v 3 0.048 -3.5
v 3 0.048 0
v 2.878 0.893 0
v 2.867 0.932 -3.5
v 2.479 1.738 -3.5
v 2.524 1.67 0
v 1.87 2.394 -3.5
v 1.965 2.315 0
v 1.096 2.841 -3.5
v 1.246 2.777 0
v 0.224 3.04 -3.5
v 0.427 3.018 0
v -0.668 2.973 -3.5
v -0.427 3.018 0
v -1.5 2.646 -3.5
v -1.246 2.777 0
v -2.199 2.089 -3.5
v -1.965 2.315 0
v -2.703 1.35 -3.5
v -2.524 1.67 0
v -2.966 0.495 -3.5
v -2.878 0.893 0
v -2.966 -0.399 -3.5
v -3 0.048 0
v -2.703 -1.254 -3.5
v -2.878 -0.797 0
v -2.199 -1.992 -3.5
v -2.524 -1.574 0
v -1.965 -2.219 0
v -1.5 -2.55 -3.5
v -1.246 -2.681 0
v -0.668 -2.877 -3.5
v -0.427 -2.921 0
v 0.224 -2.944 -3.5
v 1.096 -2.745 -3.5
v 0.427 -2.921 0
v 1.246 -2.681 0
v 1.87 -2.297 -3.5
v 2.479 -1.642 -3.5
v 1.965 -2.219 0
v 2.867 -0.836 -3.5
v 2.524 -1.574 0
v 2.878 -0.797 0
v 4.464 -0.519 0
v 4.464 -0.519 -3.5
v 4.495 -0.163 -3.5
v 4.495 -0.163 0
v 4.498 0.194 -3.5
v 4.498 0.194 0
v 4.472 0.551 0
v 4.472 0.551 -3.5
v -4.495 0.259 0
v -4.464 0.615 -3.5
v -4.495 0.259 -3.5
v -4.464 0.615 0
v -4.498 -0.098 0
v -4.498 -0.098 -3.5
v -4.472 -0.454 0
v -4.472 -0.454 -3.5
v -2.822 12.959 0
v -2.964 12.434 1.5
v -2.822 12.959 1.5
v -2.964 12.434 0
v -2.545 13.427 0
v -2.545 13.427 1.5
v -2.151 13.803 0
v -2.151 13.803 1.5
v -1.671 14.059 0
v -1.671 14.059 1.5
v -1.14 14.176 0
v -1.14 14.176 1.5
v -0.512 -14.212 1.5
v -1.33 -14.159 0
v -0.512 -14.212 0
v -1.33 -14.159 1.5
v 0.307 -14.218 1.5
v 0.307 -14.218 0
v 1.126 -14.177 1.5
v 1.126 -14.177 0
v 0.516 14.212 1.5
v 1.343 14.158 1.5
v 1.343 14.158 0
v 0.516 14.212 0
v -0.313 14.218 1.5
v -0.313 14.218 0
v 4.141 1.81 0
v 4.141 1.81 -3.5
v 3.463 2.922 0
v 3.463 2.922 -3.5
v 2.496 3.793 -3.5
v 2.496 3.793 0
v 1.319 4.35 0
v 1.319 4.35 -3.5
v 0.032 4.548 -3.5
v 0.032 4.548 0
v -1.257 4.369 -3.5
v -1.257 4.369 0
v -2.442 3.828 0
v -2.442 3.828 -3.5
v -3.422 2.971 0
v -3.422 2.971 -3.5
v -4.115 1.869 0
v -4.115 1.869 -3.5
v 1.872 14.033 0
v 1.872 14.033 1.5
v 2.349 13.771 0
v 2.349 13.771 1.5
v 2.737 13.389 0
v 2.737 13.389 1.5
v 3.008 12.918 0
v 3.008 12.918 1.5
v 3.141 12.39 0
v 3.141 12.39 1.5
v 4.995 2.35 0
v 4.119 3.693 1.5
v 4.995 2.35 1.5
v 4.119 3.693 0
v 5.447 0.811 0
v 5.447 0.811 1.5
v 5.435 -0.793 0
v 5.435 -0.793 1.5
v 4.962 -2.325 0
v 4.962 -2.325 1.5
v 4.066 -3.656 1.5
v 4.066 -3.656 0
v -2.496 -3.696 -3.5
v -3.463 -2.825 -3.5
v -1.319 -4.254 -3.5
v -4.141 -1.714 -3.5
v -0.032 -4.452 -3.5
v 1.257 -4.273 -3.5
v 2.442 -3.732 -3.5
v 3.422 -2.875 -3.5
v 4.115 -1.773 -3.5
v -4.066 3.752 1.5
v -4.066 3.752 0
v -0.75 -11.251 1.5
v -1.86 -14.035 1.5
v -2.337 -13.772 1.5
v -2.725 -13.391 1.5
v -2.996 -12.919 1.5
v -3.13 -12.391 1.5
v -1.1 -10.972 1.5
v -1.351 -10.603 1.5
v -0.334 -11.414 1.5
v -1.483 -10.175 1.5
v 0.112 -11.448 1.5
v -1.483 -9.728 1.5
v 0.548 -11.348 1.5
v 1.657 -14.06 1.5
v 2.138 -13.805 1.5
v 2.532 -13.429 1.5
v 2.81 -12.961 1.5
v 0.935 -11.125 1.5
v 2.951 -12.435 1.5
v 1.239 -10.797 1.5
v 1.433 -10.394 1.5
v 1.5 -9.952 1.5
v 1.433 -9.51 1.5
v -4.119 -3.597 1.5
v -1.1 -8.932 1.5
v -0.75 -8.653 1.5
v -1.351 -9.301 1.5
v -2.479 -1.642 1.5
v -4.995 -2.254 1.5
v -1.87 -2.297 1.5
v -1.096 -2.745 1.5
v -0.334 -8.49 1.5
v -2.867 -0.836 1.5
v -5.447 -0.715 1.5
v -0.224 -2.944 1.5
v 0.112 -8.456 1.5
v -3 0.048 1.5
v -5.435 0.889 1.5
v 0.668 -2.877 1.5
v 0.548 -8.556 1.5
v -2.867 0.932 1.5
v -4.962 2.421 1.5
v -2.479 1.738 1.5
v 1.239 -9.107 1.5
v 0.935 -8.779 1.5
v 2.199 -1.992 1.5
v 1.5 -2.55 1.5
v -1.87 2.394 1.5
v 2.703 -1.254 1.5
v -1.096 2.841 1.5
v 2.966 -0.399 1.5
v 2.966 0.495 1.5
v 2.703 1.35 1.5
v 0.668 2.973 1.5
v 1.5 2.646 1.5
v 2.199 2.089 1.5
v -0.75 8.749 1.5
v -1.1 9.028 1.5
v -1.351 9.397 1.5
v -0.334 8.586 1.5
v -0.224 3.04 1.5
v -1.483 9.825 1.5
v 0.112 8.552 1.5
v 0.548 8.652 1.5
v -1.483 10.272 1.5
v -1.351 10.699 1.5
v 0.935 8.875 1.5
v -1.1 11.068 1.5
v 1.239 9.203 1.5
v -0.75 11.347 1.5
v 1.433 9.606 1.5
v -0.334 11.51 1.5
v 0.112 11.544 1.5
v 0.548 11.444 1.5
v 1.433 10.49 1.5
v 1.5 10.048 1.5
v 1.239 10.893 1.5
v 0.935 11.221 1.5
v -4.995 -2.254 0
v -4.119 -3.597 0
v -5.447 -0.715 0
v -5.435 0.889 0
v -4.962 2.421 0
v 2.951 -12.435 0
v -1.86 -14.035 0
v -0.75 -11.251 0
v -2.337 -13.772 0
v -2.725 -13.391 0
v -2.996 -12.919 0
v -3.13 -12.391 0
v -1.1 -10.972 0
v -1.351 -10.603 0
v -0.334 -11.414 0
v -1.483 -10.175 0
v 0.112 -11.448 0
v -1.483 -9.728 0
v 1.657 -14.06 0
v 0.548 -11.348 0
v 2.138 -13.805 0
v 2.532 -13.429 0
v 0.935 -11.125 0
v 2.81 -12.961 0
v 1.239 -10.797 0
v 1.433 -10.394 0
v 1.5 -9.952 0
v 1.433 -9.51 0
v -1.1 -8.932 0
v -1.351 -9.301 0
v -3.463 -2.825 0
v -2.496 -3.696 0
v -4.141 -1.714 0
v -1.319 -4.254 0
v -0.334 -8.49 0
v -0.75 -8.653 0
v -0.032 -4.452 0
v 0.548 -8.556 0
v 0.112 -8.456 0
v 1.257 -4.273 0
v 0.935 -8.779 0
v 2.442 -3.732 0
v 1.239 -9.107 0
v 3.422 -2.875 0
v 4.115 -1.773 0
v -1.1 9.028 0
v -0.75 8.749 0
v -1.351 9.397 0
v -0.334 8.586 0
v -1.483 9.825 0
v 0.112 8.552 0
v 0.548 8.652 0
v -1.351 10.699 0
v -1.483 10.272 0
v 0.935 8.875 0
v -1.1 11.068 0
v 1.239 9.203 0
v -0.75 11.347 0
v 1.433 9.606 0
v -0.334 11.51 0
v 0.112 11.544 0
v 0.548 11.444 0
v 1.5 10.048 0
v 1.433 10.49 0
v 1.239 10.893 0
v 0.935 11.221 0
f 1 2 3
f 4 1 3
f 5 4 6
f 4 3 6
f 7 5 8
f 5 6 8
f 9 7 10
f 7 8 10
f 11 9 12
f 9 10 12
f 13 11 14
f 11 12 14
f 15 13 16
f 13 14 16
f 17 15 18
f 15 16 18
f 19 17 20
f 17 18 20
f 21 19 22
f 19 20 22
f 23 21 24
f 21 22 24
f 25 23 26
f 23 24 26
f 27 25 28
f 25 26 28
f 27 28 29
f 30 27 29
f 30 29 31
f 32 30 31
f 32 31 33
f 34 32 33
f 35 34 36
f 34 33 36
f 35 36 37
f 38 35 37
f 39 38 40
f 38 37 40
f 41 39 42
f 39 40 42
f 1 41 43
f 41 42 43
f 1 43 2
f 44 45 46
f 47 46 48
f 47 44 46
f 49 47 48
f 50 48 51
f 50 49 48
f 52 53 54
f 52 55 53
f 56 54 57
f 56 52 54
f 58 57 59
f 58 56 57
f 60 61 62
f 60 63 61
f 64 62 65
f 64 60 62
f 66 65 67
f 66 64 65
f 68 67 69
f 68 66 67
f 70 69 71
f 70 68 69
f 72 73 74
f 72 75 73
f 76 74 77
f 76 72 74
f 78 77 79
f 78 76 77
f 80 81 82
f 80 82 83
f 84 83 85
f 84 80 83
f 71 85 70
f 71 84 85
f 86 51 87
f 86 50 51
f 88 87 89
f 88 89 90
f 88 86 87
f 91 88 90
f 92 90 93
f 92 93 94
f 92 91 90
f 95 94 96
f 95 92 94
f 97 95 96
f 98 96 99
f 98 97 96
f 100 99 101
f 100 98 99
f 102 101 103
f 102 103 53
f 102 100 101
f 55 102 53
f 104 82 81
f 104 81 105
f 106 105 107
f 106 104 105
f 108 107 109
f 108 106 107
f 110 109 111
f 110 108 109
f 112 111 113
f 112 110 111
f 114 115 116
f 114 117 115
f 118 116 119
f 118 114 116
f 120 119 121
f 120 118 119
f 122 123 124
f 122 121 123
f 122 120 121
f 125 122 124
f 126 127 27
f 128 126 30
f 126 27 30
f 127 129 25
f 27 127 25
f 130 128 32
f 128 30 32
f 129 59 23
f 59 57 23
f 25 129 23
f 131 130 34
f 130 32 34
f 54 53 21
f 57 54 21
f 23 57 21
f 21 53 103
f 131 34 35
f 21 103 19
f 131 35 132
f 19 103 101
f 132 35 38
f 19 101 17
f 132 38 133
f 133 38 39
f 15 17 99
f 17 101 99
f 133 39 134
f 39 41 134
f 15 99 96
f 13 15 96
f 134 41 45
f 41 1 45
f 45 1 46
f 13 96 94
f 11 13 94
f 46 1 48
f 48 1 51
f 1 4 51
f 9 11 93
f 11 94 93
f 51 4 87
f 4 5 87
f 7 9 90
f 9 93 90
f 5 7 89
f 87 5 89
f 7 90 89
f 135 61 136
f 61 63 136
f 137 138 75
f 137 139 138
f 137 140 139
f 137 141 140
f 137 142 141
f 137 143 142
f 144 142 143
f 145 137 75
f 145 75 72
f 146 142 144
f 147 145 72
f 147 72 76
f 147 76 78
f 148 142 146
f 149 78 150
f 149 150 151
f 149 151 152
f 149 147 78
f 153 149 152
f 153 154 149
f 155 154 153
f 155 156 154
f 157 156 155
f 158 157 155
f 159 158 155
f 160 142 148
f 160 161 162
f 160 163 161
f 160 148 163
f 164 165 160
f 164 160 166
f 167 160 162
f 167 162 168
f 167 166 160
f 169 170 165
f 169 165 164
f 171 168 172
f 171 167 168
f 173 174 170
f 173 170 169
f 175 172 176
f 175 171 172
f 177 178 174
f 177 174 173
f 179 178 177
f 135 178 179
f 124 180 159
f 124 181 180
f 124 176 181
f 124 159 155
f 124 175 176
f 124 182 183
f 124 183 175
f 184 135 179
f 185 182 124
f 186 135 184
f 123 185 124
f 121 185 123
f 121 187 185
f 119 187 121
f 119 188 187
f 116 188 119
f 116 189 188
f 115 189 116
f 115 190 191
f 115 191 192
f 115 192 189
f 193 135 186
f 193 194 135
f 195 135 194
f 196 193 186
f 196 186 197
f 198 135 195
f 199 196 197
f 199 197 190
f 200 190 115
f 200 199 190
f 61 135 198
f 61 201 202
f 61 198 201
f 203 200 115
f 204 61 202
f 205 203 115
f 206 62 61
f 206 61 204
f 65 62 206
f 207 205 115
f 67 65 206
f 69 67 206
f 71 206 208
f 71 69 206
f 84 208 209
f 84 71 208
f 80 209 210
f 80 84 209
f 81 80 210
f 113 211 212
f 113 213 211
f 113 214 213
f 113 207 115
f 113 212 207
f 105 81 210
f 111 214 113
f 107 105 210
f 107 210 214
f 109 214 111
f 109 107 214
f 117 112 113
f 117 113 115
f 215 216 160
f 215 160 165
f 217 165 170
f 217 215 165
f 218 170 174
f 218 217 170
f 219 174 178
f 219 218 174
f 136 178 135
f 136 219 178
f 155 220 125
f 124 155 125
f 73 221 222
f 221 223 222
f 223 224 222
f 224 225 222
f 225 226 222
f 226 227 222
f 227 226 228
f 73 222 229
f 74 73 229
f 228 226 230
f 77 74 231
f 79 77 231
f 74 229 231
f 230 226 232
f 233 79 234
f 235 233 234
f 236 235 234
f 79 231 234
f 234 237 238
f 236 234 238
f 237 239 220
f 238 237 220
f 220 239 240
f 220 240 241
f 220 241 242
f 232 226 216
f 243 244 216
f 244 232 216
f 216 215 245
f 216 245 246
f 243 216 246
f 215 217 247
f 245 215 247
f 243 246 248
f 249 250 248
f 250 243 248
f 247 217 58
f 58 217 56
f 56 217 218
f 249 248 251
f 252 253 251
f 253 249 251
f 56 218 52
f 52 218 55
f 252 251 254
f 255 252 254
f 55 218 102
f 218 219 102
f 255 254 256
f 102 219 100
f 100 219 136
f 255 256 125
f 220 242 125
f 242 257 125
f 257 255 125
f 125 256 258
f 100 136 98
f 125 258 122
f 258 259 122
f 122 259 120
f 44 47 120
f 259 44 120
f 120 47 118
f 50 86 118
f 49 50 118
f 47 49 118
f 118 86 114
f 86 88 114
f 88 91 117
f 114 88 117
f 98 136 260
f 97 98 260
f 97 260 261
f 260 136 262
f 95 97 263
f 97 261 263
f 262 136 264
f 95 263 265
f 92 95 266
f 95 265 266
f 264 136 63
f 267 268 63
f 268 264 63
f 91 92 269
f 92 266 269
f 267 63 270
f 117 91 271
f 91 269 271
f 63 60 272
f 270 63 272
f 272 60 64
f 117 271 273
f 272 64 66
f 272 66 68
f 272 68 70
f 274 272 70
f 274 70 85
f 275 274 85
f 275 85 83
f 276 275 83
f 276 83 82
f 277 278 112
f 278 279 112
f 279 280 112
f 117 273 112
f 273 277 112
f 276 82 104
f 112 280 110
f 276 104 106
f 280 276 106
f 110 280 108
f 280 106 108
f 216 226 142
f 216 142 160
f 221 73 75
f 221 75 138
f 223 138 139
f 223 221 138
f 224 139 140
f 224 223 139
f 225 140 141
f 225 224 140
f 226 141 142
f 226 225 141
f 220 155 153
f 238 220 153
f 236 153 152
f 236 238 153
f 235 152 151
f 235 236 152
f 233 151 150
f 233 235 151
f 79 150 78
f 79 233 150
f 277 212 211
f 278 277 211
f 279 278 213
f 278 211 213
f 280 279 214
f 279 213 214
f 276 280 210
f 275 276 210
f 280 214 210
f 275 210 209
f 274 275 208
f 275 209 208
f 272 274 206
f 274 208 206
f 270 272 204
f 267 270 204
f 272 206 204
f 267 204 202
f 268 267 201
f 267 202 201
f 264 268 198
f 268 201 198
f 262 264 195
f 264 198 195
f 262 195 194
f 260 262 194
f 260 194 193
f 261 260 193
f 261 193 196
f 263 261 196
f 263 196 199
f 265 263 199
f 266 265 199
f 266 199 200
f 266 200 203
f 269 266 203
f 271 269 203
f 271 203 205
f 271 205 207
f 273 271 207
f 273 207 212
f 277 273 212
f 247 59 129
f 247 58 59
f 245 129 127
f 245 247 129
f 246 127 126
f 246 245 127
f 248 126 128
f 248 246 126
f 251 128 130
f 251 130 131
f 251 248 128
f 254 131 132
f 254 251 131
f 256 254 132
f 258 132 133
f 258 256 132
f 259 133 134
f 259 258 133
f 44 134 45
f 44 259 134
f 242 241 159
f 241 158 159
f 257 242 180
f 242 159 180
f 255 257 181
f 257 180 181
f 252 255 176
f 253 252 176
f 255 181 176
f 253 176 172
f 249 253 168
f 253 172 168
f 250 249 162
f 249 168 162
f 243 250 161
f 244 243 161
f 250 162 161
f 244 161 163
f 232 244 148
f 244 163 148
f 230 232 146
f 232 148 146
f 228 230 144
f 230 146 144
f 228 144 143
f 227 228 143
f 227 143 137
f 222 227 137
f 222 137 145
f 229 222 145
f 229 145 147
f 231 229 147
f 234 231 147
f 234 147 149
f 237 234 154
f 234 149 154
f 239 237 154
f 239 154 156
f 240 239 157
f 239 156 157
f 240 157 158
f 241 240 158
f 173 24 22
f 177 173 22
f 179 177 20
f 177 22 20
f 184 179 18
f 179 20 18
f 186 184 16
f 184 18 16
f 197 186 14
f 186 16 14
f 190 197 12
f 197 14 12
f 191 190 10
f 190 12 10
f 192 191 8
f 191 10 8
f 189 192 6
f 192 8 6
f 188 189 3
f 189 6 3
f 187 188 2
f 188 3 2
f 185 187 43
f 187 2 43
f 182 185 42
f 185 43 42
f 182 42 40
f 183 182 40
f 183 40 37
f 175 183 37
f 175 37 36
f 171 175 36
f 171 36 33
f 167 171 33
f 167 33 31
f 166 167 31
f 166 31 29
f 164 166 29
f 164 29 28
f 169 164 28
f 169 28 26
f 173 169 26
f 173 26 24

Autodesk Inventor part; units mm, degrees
ref_plane "YZ Plane" through (0, 0, 0) normal (1, 0, 0) x (0, 1, 0)
ref_plane "XZ Plane" through (0, 0, 0) normal (0, 1, 0) x (-1, 0, 0)
ref_plane "XY Plane" through (0, 0, 0) normal (0, 0, 1) x (1, 0, 0)
sketch "Sketch1" plane through (0, 0, 0) normal (0, 0, 1) x (1, 0, 0)
  circle A0 centre (0, 0.0481) radius 3
  circle A1 centre (0, 0.0481) radius 1.5
  circle A2 centre (0, 0.0481) radius 5.5
  arc A3 (2.6218, 17.0122) -> (-2.3779, 17.0481) centre (0.1221, 17.0481) ccw
  line L0 (0.1221, 17.0481) -> (-2.3779, 17.0481) construction
  line L1 (0.1221, 17.0481) -> (2.6221, 17.0481) construction
  line L2 (2.6221, 17.0481) -> (0.1221, 17.0481) construction
  line L3 (-2.3779, 17.0481) -> (-4.4642, 0.6149)
  line L4 (0.1221, 17.0481) -> (0, 0.0481) construction
  line L5 (2.6218, 17.0122) -> (4.4718, 0.5507)
  line L6 (0, 0.0481) -> (-9.4947, 0.1163) construction
  arc A4 (-2.6218, -16.916) -> (2.3779, -16.9519) centre (-0.1221, -16.9519) ccw
  line L7 (-2.6218, -16.916) -> (-4.4718, -0.4544)
  line L8 (2.3779, -16.9519) -> (4.4642, -0.5186)
  arc A5 (-4.4642, 0.6149) -> (-4.4718, -0.4544) centre (0, 0.0481) ccw
  arc A6 (4.4642, -0.5186) -> (4.4718, 0.5507) centre (0, 0.0481) ccw
  circle A7 centre (0, 0.0481) radius 4.5
  dimension "d1" = 3
  dimension "d2" = 6
  dimension "d4" = 11
  dimension "d5" = 5
  dimension "d6" = 17
  dimension "d8" = 16.5652
  dimension "d9" = 16.5652
  dimension "d10" = 97.235
  dimension "d20" = 13.9277
extrude "Extrusion1" add sketch "Sketch1" along normal blind 1.5 contours L5 A7 L3 A2 | A2 L3 A3 L5 | L8 A4 L7 A2 | A2 L7 A7 L8 | A6 A7 A5
extrude "Extrusion2" add sketch "Sketch1" along normal blind 1.5 contours A2 L8 A6 L5 | L5 A7 L3 A2 | A2 L7 A7 L8 | L3 A5 L7 A2 | A6 A7 A5
extrude "Extrusion3" add sketch "Sketch1" against normal blind 3.5 contours A6 A7 A5
extrude "Extrusion4" add sketch "Sketch1" along normal blind 1.5 contours A0
sketch "Sketch2" plane through (0, 0, 1.5) normal (0, 0, 1) x (1, 0, 0)
  circle A0 centre (0, 0.0481) radius 3 projected
  circle A1 centre (0, 10.0481) radius 1.5
  circle A2 centre (0, -9.9519) radius 1.5
  dimension "d25" = 3
  dimension "d26" = 3
  dimension "d29" = 10
  dimension "d30" = 10
extrude "Extrusion5" cut sketch "Sketch2" against normal blind 2 contours A1 | A2
sketch "Sketch3" plane through (0, 0.0481, 0) normal (0, 0, -1) x (-1, 0, 0)
  circle A0 centre (0, 0) radius 1.5 projected
  circle A1 centre (0, 0) radius 3 projected
  point P0 (0, -0.0481)
extrude "Extrusion6" cut sketch "Sketch3" against normal up to next
sketch "Sketch4" plane through (0, 0, 1.5) normal (0, 0, 1) x (1, 0, 0)
  circle A0 centre (0, -9.9519) radius 1.5 projected
  circle A1 centre (0, 10.0481) radius 1.5 projected
  line L0 (2.6218, 17.0122) -> (4.1187, 3.6932) projected
  arc A2 (2.6218, 17.0122) -> (-2.3779, 17.0481) centre (0.1221, 17.0481) ccw projected
  line L1 (-4.0659, 3.752) -> (-2.3779, 17.0481) projected
  line L2 (-2.6218, -16.916) -> (-4.1187, -3.5969) projected
  arc A3 (-2.6218, -16.916) -> (2.3779, -16.9519) centre (-0.1221, -16.9519) ccw projected
  line L3 (4.0659, -3.6557) -> (2.3779, -16.9519) projected
  line L4 (0.1221, 17.0481) -> (0, 10.0481) construction
  line L5 (0, -9.9519) -> (-0.1221, -16.9519) construction
  arc A4 (-2.9596, -13.91) -> (2.7589, -13.9512) centre (0, 0) ccw
  arc A5 (2.9707, 13.9077) -> (-2.7714, 13.9487) centre (0, 0) ccw
extrude "Extrusion7" cut sketch "Sketch4" against normal up to next contours L0 A5 L1 A2 | L2 A4 L3 A3
fillet "Fillet1" radius 2 4 edges at (2.7589, -13.9512, 0.75) (-2.9596, -13.91, 0.75) (2.9707, 13.9077, 0.75) (-2.7714, 13.9487, 0.75)
properties part number "acople para eje falso"
